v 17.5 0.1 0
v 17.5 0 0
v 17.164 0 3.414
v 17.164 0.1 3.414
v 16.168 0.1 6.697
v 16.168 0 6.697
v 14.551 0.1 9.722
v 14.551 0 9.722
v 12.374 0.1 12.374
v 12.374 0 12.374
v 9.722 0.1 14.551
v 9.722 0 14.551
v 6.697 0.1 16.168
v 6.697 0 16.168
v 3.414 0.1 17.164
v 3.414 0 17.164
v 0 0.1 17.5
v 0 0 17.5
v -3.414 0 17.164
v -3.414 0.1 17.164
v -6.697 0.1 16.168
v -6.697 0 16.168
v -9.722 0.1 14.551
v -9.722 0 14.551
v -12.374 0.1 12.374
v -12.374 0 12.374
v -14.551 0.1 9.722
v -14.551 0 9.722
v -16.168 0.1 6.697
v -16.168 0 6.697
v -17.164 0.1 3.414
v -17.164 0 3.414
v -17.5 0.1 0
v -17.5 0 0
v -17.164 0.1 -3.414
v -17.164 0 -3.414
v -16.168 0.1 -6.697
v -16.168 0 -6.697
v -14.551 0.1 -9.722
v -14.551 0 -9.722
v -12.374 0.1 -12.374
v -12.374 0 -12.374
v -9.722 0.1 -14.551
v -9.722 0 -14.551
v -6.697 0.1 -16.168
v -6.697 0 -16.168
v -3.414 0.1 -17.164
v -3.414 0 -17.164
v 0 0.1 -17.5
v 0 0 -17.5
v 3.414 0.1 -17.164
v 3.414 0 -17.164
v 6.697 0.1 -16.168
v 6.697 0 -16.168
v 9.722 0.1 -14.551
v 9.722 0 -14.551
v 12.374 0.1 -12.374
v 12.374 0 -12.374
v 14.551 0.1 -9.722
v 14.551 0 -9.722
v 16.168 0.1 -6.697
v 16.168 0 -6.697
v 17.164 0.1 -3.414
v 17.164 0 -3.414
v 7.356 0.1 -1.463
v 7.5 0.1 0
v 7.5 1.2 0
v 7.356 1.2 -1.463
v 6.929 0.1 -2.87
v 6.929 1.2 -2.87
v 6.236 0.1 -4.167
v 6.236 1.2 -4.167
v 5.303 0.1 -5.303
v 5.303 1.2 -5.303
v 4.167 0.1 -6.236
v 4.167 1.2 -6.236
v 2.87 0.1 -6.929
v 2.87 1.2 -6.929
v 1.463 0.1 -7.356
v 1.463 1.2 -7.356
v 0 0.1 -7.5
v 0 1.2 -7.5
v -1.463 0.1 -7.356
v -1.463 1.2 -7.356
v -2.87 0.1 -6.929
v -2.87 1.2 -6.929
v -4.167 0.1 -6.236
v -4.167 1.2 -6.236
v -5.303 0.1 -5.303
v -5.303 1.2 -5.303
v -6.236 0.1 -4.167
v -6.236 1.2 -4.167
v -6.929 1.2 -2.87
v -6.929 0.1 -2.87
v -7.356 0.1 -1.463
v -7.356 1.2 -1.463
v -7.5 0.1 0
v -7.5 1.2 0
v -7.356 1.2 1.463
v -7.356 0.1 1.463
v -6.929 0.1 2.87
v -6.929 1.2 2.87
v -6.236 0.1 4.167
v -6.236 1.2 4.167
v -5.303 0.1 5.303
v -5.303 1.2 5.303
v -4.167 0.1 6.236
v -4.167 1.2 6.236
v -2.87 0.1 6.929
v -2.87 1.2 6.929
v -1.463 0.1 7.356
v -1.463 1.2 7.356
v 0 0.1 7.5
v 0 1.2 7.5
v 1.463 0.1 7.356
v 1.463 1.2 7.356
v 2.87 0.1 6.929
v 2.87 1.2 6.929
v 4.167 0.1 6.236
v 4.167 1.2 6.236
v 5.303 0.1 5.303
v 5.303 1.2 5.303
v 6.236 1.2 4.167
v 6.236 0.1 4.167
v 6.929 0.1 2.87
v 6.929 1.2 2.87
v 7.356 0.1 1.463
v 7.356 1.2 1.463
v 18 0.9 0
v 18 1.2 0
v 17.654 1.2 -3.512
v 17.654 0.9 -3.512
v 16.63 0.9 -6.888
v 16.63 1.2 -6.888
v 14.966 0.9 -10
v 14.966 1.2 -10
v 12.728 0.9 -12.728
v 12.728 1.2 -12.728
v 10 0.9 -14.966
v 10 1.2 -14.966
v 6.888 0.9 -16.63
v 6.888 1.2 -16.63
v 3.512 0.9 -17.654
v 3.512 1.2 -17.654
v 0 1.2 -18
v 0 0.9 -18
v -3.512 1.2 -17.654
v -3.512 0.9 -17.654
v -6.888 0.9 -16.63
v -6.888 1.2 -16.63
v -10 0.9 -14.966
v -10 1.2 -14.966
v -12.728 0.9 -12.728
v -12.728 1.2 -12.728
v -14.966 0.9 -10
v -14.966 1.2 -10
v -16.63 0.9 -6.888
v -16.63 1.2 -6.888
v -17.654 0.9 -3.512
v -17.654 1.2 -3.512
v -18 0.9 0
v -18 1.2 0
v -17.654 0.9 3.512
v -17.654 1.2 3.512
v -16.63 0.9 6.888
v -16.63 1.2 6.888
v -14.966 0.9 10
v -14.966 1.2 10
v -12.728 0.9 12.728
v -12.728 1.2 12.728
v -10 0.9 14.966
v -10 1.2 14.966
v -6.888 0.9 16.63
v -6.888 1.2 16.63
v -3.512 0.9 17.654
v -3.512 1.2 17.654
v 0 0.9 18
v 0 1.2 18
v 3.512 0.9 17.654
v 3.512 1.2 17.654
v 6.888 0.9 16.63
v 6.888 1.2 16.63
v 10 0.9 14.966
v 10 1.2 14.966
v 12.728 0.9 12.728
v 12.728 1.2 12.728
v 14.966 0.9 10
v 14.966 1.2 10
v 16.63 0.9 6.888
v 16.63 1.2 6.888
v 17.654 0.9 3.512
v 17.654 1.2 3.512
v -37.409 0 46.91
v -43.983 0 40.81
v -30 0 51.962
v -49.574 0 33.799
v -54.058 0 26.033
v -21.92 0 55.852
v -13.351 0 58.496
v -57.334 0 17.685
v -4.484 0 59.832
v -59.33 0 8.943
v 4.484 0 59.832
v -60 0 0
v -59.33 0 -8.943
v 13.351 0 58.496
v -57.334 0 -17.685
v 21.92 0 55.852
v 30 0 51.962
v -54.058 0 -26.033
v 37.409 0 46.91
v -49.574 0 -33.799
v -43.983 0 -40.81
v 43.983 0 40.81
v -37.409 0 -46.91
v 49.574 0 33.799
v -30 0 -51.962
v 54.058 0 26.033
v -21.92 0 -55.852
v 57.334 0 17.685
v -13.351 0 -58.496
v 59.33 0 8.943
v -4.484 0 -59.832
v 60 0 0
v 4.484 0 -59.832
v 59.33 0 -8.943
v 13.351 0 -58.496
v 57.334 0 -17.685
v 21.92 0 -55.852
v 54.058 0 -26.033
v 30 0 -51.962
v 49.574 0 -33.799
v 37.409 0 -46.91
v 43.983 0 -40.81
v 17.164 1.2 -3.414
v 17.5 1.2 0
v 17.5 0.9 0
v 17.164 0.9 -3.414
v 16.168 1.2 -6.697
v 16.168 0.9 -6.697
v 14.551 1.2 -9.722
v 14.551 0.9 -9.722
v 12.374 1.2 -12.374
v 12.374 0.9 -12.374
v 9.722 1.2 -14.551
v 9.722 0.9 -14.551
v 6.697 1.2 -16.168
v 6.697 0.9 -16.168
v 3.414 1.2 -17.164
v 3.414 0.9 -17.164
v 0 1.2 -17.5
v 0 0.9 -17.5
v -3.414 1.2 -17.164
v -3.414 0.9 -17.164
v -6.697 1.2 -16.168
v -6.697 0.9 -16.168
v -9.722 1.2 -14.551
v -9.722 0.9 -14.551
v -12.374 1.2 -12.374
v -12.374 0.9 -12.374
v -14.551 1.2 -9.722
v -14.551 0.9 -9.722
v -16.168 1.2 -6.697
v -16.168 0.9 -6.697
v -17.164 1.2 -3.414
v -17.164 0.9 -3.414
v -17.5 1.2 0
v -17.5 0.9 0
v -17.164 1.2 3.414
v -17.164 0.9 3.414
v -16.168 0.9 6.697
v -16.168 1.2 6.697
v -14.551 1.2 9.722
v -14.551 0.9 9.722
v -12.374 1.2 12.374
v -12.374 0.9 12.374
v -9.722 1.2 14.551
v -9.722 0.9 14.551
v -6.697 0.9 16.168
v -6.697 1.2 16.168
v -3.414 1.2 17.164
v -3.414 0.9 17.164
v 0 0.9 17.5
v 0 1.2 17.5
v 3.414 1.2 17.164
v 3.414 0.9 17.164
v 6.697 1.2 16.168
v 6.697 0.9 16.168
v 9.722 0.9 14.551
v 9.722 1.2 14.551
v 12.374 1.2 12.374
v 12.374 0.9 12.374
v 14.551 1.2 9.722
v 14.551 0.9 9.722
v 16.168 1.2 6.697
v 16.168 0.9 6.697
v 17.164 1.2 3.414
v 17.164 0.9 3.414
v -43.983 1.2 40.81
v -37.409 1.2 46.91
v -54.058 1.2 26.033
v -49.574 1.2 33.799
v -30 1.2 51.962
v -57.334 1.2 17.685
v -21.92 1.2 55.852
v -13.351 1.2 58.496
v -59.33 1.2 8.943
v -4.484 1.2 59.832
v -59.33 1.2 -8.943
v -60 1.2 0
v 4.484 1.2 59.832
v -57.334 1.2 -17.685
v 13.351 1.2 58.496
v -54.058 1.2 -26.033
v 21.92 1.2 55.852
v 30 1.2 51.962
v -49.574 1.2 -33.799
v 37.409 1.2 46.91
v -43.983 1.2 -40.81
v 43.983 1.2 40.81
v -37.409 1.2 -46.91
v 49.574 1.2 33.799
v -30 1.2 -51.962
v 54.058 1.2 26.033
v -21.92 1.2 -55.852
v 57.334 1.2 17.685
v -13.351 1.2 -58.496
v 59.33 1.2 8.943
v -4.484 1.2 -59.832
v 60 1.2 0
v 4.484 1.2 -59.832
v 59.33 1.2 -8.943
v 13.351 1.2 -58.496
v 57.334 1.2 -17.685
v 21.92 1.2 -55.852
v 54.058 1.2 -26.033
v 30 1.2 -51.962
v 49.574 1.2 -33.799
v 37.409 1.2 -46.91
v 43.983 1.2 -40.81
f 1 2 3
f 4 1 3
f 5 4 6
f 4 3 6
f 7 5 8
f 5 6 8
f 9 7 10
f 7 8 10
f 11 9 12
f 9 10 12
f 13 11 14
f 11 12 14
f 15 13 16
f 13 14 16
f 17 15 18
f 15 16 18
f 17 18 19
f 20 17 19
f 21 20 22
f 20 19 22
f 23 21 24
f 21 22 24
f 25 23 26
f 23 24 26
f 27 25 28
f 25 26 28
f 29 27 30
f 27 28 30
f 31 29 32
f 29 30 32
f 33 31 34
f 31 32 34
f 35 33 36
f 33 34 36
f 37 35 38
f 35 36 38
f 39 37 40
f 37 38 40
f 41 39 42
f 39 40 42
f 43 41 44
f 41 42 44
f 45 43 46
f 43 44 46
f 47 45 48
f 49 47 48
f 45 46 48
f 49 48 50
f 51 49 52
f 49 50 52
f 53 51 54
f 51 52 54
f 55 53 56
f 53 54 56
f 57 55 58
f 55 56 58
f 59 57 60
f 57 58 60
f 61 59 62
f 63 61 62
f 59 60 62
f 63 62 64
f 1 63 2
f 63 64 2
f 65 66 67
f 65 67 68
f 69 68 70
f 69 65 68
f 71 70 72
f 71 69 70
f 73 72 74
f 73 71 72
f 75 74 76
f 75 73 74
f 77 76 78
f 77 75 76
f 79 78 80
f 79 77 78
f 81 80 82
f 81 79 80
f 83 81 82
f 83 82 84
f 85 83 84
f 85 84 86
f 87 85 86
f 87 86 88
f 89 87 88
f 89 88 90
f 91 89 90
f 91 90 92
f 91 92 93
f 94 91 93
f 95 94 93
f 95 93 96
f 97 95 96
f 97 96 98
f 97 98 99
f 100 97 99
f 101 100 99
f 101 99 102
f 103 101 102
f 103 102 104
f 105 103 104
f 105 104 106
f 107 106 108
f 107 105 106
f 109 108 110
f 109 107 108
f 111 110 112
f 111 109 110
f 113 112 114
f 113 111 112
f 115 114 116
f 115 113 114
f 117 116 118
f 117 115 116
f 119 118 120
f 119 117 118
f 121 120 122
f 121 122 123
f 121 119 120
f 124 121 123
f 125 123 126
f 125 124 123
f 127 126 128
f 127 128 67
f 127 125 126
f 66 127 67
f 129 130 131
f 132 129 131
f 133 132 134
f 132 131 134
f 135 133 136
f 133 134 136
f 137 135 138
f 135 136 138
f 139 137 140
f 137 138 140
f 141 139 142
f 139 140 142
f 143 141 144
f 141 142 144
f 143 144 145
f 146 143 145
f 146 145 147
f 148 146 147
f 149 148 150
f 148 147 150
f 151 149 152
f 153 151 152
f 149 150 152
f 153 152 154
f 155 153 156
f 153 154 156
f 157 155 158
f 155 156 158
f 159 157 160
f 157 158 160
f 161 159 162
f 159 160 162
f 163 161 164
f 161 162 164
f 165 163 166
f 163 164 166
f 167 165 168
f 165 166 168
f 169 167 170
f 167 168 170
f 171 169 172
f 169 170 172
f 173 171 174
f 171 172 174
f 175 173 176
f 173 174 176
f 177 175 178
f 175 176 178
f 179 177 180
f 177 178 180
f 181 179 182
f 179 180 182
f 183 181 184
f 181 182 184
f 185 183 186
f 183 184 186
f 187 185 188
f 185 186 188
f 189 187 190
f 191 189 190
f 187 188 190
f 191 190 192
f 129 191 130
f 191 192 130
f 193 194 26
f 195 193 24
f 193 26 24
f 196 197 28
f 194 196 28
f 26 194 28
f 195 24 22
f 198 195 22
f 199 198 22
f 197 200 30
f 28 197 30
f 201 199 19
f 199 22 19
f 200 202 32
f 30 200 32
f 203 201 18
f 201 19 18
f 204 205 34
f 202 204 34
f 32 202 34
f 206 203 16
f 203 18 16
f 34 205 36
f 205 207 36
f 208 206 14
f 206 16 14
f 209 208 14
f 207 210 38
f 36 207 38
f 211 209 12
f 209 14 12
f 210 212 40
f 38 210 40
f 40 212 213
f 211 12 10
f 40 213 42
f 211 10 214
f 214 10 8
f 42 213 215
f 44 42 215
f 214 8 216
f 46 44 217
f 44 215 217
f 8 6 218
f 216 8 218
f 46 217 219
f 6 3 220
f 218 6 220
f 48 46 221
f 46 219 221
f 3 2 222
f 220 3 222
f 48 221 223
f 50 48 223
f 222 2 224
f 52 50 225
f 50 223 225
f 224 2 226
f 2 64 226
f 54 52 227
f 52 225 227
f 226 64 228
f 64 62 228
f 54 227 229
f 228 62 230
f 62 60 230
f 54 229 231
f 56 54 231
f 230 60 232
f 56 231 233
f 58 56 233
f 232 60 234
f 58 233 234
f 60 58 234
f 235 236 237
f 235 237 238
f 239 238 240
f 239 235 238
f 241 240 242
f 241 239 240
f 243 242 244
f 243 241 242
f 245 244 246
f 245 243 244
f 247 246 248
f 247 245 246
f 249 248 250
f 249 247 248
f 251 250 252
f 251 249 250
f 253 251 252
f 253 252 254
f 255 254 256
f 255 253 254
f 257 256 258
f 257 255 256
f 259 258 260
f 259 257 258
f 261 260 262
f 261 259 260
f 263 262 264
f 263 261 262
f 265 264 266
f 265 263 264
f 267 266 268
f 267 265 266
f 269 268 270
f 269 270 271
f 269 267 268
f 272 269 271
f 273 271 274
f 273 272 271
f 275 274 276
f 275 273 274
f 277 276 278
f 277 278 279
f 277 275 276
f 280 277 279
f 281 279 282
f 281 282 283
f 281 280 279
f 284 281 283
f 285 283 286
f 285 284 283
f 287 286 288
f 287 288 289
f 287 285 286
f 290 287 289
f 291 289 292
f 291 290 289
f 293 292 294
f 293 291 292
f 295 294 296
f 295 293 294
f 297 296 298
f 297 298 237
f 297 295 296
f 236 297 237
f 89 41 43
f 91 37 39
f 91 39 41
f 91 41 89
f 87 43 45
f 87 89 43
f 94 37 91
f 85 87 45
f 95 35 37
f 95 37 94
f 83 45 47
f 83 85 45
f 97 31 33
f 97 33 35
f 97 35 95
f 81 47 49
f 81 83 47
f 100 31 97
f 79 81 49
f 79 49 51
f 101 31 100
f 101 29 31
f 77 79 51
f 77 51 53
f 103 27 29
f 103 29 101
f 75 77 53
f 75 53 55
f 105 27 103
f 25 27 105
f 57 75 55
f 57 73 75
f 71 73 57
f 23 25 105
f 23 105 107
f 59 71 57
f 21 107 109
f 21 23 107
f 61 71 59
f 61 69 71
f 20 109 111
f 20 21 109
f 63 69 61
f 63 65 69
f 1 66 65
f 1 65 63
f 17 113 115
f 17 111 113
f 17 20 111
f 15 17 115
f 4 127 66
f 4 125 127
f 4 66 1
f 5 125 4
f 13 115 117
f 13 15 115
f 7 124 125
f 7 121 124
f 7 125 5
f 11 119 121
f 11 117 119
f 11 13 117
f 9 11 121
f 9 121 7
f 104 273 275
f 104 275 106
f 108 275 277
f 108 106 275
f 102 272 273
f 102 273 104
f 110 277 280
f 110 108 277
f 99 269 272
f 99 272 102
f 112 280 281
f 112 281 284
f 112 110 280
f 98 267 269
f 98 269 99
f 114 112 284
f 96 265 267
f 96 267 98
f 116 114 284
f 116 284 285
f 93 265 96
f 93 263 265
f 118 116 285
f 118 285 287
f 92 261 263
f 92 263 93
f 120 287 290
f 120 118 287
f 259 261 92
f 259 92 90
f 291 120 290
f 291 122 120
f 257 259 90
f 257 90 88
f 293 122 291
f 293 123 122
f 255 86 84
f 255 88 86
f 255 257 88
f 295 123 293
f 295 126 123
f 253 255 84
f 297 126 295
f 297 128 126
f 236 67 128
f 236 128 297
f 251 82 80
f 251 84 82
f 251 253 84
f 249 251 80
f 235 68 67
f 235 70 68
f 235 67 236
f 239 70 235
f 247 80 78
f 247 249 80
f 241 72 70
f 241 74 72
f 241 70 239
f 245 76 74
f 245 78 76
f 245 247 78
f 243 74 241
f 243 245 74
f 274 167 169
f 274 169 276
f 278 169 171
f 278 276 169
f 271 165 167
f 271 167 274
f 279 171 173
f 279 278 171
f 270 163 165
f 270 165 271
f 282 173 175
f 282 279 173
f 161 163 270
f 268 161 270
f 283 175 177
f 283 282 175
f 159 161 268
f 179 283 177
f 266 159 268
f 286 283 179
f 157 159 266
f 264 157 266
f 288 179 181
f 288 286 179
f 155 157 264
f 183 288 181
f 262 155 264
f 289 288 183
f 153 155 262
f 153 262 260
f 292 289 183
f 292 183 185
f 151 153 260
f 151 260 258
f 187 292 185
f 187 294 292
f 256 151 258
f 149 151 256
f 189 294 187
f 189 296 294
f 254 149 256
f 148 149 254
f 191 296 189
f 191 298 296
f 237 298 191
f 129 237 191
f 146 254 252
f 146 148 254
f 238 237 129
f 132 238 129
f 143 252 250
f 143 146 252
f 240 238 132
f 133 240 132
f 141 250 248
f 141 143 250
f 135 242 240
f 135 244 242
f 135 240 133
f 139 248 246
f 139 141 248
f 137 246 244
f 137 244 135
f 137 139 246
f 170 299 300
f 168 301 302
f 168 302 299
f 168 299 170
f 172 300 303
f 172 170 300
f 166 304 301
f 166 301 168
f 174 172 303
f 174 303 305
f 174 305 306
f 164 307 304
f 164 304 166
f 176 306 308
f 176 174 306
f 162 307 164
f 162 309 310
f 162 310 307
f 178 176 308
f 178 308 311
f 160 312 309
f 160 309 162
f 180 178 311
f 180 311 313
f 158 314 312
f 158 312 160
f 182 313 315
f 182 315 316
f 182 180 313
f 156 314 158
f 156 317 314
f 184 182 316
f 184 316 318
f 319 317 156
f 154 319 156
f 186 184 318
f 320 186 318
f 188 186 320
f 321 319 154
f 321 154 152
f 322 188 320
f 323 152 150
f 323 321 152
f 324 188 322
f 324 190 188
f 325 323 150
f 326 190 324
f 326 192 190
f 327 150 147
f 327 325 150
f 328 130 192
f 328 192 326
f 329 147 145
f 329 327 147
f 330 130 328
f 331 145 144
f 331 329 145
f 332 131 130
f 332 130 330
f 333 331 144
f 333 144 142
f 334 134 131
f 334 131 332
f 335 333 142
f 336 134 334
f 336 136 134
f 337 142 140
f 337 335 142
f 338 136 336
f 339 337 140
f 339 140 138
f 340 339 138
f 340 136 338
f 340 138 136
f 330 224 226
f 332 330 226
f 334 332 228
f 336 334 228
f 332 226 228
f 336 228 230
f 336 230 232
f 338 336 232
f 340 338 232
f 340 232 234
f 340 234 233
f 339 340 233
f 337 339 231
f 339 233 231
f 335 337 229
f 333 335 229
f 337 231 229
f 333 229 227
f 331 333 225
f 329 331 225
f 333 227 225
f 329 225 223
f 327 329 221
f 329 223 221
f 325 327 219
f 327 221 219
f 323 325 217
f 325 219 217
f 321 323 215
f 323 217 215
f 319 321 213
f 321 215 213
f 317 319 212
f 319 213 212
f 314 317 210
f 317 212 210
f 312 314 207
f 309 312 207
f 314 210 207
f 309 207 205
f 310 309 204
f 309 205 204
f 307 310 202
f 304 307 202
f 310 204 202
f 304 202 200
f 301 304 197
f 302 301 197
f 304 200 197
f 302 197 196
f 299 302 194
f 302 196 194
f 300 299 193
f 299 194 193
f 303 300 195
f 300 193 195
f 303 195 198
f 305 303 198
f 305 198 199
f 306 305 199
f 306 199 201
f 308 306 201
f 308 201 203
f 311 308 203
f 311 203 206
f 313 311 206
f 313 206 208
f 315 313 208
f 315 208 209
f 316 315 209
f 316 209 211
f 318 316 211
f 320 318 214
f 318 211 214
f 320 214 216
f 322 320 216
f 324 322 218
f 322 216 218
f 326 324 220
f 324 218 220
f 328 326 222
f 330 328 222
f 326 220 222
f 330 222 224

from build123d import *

# Parameters (mm, degrees)
SKETCH1_R           = 60
SKETCH1_R_2         = 7.5
BOSS_EXTRUDE1_DEPTH = 1.2
SKETCH2_R           = 18
SKETCH2_R_2         = 17.5
CUT_EXTRUDE1_DEPTH  = 0.3
SKETCH4_R           = 17.5
CUT_EXTRUDE2_DEPTH  = 0.1


with BuildPart() as part:
    # Sketch1 → Boss-Extrude1 (new body)
    with BuildSketch(Plane(origin=(0, 0, 0), x_dir=(1, 0, 0), z_dir=(0, 1, 0))):
        Circle(SKETCH1_R)
        Circle(SKETCH1_R_2, mode=Mode.SUBTRACT)
    extrude(amount=BOSS_EXTRUDE1_DEPTH)

    # Sketch2 → Cut-Extrude1 (cut)
    with BuildSketch(Plane(origin=(0, 1.2, 0), x_dir=(1, 0, 0), z_dir=(0, 1, 0))):
        Circle(SKETCH2_R)
        Circle(SKETCH2_R_2, mode=Mode.SUBTRACT)
    extrude(amount=-CUT_EXTRUDE1_DEPTH, mode=Mode.SUBTRACT)

    # Sketch4 → Cut-Extrude2 (cut)
    with BuildSketch(Plane.XZ):
        Circle(SKETCH4_R)
    extrude(amount=-CUT_EXTRUDE2_DEPTH, mode=Mode.SUBTRACT)


solid = part.part
